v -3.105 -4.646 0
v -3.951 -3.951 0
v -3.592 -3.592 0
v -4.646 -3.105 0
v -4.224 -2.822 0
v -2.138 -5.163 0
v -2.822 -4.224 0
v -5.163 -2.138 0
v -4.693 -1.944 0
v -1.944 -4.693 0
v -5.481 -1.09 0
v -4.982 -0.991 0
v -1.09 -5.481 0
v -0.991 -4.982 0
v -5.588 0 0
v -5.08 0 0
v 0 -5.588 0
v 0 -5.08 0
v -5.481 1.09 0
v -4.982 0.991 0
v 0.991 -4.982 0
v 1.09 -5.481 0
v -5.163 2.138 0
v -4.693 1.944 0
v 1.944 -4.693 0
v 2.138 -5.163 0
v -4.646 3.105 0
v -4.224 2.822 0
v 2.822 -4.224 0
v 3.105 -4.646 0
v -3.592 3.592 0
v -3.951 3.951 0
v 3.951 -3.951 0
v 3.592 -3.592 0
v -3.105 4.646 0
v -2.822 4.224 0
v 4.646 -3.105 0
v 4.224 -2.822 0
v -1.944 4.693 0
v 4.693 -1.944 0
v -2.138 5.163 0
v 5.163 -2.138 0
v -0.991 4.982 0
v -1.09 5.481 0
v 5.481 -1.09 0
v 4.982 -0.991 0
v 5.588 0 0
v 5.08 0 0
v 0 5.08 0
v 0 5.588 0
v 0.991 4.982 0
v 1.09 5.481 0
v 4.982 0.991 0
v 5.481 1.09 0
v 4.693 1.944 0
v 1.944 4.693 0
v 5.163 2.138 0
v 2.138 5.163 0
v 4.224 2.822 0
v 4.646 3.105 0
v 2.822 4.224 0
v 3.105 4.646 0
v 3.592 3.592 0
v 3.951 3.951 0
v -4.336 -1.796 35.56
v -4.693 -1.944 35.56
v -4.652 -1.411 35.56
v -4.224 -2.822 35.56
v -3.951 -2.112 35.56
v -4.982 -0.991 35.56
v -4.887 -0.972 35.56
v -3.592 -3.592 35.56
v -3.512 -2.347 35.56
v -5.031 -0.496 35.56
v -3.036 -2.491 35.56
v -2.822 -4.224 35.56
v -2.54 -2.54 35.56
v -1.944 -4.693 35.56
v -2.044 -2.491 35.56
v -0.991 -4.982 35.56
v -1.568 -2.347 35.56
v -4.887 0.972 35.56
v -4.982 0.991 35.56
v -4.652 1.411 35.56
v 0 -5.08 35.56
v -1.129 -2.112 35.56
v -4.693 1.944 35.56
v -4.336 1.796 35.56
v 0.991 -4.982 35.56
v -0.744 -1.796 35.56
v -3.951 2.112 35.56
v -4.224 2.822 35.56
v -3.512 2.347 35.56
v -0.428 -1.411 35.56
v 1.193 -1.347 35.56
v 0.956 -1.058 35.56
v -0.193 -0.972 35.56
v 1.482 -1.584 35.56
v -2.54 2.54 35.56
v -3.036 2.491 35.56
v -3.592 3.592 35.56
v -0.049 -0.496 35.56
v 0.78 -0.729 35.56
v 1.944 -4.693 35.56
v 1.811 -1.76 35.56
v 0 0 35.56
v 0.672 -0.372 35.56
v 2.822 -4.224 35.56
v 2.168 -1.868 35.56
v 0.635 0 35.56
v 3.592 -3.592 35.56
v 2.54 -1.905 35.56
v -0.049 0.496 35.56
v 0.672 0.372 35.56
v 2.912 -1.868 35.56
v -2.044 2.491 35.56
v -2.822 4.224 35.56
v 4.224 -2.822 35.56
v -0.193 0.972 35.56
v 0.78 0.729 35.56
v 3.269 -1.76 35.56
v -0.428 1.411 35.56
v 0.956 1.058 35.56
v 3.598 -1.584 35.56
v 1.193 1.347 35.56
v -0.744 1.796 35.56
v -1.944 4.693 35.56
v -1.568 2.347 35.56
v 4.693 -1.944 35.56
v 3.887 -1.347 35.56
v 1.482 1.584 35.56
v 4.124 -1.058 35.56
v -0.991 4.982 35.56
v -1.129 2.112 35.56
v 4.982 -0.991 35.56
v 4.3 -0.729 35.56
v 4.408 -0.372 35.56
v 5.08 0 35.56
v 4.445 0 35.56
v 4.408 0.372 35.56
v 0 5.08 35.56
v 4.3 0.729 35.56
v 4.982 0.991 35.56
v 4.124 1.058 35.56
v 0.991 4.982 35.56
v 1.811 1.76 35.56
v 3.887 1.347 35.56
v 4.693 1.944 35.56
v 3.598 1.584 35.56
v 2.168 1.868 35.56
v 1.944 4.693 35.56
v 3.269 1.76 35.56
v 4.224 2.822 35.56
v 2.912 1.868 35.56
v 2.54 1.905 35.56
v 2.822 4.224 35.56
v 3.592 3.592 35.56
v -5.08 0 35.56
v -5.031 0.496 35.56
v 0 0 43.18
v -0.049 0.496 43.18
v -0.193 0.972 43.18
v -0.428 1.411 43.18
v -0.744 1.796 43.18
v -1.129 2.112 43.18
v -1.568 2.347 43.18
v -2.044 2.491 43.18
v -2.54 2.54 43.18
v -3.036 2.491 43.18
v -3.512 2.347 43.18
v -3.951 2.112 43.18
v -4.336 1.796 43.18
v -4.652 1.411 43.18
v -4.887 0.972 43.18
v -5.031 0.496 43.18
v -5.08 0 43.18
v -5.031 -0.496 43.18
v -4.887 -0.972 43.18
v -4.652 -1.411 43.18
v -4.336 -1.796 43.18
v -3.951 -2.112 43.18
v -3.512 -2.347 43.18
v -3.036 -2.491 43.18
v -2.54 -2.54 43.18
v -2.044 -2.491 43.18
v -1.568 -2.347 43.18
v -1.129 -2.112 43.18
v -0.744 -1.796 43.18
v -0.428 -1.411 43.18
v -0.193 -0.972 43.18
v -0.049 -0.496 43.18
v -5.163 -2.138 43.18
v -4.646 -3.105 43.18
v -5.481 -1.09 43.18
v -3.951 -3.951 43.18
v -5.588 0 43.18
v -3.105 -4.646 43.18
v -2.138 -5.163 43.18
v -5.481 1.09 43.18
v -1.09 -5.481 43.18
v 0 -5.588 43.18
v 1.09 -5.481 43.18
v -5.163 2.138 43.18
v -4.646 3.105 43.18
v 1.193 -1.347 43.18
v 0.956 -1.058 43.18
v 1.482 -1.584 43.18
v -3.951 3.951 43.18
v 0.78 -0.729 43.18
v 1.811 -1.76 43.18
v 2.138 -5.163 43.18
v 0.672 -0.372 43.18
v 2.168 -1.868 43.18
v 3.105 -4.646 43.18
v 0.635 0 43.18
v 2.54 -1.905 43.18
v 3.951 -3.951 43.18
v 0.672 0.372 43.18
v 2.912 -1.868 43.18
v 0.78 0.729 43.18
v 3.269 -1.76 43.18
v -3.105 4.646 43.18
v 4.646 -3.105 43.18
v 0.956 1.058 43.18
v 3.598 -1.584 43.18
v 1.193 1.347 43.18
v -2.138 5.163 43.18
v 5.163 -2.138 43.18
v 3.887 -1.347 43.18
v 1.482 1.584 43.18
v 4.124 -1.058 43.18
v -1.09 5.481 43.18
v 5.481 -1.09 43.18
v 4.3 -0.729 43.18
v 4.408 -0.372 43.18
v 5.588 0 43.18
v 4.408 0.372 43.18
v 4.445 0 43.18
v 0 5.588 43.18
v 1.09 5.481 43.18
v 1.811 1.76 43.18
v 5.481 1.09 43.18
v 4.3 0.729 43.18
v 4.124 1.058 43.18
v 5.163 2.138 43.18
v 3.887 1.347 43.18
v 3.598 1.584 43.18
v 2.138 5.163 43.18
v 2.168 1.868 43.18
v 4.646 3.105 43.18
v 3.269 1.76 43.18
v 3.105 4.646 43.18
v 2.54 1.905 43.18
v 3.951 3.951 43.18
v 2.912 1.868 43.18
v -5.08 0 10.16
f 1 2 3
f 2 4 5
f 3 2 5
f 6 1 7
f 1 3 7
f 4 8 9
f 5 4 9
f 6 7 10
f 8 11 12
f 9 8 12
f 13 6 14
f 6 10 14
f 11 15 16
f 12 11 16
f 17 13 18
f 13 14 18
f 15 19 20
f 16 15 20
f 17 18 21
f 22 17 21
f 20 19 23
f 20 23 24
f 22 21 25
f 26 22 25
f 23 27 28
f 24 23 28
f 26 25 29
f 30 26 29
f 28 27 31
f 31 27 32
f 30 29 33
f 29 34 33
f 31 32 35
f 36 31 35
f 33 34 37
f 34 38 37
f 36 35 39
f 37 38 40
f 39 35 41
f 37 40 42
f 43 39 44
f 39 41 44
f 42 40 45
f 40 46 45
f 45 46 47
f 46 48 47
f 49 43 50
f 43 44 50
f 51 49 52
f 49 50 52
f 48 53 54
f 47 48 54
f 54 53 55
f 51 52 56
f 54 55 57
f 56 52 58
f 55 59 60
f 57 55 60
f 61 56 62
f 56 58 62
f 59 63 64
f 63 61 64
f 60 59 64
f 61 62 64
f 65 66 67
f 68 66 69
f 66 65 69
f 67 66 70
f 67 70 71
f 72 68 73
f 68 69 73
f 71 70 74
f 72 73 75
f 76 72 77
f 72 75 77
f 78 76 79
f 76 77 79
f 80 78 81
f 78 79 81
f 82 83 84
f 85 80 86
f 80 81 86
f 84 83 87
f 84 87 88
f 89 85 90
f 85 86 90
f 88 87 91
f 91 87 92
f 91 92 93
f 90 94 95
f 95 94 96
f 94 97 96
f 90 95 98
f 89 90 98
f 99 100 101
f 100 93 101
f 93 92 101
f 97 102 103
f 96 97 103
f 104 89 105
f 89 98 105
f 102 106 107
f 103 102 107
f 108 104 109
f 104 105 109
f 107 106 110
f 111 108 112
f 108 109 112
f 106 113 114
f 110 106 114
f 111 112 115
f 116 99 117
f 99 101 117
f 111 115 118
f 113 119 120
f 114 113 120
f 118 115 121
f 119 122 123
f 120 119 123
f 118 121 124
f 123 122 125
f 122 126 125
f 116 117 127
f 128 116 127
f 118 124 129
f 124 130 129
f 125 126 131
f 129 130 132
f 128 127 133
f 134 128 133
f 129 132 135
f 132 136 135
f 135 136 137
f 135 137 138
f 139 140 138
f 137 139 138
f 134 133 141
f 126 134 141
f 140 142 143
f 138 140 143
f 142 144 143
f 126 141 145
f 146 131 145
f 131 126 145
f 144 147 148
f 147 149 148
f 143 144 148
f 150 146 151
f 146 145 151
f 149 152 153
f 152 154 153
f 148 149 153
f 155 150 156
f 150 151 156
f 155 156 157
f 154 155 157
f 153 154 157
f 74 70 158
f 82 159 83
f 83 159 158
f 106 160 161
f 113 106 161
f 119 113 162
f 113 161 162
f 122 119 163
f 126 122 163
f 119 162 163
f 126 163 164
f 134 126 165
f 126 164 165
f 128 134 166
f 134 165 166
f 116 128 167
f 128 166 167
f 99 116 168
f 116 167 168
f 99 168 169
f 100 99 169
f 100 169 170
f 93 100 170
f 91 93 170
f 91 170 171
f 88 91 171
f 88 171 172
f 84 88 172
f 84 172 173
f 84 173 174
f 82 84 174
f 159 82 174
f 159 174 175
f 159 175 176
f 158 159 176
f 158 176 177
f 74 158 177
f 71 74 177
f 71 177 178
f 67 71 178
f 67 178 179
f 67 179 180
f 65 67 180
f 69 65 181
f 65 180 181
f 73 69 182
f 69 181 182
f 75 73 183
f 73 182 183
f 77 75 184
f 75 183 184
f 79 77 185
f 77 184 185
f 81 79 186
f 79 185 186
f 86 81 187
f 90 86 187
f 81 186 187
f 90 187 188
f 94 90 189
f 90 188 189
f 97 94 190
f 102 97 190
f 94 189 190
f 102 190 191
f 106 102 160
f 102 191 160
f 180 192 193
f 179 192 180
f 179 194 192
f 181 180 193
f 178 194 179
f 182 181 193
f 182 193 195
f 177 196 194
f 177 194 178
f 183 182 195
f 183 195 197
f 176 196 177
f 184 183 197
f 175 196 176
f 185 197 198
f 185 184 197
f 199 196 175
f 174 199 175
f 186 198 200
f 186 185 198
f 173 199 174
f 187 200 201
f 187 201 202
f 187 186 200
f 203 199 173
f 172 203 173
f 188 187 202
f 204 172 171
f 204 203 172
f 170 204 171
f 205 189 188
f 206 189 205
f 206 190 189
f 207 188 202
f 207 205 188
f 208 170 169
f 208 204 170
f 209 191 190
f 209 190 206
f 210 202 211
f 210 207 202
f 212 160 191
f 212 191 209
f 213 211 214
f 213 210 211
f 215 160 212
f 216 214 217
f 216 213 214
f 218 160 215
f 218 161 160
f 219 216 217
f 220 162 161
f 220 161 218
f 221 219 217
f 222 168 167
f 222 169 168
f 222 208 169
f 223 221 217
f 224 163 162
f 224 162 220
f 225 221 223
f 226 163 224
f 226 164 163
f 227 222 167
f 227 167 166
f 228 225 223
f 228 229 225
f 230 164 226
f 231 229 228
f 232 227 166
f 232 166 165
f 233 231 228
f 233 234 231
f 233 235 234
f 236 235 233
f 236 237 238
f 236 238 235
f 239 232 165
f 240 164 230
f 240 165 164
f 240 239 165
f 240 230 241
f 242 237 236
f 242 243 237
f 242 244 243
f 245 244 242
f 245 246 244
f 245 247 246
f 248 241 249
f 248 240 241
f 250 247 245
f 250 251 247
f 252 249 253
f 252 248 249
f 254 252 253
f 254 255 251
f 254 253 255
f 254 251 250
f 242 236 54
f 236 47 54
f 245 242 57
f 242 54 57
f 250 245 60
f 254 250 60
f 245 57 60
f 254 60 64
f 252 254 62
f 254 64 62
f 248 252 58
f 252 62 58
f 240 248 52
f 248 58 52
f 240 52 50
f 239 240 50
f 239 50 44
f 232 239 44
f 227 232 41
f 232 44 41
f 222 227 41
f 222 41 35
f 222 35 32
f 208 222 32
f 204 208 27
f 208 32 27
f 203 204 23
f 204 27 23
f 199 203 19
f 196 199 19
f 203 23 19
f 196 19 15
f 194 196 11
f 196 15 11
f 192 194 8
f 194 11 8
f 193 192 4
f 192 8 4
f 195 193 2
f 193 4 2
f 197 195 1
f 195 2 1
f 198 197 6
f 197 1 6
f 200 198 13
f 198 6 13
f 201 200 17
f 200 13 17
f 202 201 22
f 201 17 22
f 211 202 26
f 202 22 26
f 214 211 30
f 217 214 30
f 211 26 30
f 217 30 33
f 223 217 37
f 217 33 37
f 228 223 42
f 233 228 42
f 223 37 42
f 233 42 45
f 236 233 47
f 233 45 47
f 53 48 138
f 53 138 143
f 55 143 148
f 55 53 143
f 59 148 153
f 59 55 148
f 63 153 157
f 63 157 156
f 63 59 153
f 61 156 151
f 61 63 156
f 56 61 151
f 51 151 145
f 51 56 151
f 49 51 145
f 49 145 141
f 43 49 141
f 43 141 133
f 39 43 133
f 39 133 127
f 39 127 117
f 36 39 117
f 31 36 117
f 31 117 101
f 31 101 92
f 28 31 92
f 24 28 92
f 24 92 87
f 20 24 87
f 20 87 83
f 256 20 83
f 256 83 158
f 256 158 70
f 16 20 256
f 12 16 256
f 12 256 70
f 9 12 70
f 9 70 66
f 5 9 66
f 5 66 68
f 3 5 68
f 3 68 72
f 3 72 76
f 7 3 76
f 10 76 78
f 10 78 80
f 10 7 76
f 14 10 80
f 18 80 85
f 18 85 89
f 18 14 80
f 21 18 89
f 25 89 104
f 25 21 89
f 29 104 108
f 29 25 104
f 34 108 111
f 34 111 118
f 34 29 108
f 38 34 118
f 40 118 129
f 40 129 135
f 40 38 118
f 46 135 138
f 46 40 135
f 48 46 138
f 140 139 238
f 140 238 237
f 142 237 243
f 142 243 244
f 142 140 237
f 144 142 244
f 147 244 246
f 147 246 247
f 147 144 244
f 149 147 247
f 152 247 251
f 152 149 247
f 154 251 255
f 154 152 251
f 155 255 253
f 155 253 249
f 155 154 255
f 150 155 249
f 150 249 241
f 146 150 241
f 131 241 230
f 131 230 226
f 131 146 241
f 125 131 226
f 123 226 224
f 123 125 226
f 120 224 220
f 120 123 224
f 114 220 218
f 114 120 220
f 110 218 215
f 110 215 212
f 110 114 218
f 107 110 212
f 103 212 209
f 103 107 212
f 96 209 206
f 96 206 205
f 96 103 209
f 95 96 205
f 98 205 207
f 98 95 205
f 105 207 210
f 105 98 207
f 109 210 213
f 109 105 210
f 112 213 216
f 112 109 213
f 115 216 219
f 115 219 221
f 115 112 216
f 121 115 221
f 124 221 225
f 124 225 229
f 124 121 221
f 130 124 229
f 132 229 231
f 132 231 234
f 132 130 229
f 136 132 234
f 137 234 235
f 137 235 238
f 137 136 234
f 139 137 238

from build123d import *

# Parameters (mm, degrees)
SKETCH1_R           = 5.588
SKETCH1_R_2         = 5.08
BOSS_EXTRUDE1_DEPTH = 35.56
SKETCH2_R           = 5.588
SKETCH2_R_2         = 1.905
BOSS_EXTRUDE2_DEPTH = 7.62
SKETCH3_R           = 2.54
CUT_EXTRUDE1_DEPTH  = 33.02


with BuildPart() as part:
    # Sketch1 → Boss-Extrude1 (new body)
    with BuildSketch(Plane.XY):
        Circle(SKETCH1_R)
        Circle(SKETCH1_R_2, mode=Mode.SUBTRACT)
    extrude(amount=BOSS_EXTRUDE1_DEPTH)

    # Sketch2 → Boss-Extrude2 (add)
    with BuildSketch(Plane.XY.offset(35.56)):
        Circle(SKETCH2_R)
        with Locations((2.54, 0)):
            Circle(SKETCH2_R_2, mode=Mode.SUBTRACT)
    extrude(amount=BOSS_EXTRUDE2_DEPTH)

    # Sketch3 → Cut-Extrude1 (cut)
    with BuildSketch(Plane.XY.offset(43.18)):
        with Locations((-2.54, 0)):
            Circle(SKETCH3_R)
    extrude(amount=-CUT_EXTRUDE1_DEPTH, mode=Mode.SUBTRACT)


solid = part.part
